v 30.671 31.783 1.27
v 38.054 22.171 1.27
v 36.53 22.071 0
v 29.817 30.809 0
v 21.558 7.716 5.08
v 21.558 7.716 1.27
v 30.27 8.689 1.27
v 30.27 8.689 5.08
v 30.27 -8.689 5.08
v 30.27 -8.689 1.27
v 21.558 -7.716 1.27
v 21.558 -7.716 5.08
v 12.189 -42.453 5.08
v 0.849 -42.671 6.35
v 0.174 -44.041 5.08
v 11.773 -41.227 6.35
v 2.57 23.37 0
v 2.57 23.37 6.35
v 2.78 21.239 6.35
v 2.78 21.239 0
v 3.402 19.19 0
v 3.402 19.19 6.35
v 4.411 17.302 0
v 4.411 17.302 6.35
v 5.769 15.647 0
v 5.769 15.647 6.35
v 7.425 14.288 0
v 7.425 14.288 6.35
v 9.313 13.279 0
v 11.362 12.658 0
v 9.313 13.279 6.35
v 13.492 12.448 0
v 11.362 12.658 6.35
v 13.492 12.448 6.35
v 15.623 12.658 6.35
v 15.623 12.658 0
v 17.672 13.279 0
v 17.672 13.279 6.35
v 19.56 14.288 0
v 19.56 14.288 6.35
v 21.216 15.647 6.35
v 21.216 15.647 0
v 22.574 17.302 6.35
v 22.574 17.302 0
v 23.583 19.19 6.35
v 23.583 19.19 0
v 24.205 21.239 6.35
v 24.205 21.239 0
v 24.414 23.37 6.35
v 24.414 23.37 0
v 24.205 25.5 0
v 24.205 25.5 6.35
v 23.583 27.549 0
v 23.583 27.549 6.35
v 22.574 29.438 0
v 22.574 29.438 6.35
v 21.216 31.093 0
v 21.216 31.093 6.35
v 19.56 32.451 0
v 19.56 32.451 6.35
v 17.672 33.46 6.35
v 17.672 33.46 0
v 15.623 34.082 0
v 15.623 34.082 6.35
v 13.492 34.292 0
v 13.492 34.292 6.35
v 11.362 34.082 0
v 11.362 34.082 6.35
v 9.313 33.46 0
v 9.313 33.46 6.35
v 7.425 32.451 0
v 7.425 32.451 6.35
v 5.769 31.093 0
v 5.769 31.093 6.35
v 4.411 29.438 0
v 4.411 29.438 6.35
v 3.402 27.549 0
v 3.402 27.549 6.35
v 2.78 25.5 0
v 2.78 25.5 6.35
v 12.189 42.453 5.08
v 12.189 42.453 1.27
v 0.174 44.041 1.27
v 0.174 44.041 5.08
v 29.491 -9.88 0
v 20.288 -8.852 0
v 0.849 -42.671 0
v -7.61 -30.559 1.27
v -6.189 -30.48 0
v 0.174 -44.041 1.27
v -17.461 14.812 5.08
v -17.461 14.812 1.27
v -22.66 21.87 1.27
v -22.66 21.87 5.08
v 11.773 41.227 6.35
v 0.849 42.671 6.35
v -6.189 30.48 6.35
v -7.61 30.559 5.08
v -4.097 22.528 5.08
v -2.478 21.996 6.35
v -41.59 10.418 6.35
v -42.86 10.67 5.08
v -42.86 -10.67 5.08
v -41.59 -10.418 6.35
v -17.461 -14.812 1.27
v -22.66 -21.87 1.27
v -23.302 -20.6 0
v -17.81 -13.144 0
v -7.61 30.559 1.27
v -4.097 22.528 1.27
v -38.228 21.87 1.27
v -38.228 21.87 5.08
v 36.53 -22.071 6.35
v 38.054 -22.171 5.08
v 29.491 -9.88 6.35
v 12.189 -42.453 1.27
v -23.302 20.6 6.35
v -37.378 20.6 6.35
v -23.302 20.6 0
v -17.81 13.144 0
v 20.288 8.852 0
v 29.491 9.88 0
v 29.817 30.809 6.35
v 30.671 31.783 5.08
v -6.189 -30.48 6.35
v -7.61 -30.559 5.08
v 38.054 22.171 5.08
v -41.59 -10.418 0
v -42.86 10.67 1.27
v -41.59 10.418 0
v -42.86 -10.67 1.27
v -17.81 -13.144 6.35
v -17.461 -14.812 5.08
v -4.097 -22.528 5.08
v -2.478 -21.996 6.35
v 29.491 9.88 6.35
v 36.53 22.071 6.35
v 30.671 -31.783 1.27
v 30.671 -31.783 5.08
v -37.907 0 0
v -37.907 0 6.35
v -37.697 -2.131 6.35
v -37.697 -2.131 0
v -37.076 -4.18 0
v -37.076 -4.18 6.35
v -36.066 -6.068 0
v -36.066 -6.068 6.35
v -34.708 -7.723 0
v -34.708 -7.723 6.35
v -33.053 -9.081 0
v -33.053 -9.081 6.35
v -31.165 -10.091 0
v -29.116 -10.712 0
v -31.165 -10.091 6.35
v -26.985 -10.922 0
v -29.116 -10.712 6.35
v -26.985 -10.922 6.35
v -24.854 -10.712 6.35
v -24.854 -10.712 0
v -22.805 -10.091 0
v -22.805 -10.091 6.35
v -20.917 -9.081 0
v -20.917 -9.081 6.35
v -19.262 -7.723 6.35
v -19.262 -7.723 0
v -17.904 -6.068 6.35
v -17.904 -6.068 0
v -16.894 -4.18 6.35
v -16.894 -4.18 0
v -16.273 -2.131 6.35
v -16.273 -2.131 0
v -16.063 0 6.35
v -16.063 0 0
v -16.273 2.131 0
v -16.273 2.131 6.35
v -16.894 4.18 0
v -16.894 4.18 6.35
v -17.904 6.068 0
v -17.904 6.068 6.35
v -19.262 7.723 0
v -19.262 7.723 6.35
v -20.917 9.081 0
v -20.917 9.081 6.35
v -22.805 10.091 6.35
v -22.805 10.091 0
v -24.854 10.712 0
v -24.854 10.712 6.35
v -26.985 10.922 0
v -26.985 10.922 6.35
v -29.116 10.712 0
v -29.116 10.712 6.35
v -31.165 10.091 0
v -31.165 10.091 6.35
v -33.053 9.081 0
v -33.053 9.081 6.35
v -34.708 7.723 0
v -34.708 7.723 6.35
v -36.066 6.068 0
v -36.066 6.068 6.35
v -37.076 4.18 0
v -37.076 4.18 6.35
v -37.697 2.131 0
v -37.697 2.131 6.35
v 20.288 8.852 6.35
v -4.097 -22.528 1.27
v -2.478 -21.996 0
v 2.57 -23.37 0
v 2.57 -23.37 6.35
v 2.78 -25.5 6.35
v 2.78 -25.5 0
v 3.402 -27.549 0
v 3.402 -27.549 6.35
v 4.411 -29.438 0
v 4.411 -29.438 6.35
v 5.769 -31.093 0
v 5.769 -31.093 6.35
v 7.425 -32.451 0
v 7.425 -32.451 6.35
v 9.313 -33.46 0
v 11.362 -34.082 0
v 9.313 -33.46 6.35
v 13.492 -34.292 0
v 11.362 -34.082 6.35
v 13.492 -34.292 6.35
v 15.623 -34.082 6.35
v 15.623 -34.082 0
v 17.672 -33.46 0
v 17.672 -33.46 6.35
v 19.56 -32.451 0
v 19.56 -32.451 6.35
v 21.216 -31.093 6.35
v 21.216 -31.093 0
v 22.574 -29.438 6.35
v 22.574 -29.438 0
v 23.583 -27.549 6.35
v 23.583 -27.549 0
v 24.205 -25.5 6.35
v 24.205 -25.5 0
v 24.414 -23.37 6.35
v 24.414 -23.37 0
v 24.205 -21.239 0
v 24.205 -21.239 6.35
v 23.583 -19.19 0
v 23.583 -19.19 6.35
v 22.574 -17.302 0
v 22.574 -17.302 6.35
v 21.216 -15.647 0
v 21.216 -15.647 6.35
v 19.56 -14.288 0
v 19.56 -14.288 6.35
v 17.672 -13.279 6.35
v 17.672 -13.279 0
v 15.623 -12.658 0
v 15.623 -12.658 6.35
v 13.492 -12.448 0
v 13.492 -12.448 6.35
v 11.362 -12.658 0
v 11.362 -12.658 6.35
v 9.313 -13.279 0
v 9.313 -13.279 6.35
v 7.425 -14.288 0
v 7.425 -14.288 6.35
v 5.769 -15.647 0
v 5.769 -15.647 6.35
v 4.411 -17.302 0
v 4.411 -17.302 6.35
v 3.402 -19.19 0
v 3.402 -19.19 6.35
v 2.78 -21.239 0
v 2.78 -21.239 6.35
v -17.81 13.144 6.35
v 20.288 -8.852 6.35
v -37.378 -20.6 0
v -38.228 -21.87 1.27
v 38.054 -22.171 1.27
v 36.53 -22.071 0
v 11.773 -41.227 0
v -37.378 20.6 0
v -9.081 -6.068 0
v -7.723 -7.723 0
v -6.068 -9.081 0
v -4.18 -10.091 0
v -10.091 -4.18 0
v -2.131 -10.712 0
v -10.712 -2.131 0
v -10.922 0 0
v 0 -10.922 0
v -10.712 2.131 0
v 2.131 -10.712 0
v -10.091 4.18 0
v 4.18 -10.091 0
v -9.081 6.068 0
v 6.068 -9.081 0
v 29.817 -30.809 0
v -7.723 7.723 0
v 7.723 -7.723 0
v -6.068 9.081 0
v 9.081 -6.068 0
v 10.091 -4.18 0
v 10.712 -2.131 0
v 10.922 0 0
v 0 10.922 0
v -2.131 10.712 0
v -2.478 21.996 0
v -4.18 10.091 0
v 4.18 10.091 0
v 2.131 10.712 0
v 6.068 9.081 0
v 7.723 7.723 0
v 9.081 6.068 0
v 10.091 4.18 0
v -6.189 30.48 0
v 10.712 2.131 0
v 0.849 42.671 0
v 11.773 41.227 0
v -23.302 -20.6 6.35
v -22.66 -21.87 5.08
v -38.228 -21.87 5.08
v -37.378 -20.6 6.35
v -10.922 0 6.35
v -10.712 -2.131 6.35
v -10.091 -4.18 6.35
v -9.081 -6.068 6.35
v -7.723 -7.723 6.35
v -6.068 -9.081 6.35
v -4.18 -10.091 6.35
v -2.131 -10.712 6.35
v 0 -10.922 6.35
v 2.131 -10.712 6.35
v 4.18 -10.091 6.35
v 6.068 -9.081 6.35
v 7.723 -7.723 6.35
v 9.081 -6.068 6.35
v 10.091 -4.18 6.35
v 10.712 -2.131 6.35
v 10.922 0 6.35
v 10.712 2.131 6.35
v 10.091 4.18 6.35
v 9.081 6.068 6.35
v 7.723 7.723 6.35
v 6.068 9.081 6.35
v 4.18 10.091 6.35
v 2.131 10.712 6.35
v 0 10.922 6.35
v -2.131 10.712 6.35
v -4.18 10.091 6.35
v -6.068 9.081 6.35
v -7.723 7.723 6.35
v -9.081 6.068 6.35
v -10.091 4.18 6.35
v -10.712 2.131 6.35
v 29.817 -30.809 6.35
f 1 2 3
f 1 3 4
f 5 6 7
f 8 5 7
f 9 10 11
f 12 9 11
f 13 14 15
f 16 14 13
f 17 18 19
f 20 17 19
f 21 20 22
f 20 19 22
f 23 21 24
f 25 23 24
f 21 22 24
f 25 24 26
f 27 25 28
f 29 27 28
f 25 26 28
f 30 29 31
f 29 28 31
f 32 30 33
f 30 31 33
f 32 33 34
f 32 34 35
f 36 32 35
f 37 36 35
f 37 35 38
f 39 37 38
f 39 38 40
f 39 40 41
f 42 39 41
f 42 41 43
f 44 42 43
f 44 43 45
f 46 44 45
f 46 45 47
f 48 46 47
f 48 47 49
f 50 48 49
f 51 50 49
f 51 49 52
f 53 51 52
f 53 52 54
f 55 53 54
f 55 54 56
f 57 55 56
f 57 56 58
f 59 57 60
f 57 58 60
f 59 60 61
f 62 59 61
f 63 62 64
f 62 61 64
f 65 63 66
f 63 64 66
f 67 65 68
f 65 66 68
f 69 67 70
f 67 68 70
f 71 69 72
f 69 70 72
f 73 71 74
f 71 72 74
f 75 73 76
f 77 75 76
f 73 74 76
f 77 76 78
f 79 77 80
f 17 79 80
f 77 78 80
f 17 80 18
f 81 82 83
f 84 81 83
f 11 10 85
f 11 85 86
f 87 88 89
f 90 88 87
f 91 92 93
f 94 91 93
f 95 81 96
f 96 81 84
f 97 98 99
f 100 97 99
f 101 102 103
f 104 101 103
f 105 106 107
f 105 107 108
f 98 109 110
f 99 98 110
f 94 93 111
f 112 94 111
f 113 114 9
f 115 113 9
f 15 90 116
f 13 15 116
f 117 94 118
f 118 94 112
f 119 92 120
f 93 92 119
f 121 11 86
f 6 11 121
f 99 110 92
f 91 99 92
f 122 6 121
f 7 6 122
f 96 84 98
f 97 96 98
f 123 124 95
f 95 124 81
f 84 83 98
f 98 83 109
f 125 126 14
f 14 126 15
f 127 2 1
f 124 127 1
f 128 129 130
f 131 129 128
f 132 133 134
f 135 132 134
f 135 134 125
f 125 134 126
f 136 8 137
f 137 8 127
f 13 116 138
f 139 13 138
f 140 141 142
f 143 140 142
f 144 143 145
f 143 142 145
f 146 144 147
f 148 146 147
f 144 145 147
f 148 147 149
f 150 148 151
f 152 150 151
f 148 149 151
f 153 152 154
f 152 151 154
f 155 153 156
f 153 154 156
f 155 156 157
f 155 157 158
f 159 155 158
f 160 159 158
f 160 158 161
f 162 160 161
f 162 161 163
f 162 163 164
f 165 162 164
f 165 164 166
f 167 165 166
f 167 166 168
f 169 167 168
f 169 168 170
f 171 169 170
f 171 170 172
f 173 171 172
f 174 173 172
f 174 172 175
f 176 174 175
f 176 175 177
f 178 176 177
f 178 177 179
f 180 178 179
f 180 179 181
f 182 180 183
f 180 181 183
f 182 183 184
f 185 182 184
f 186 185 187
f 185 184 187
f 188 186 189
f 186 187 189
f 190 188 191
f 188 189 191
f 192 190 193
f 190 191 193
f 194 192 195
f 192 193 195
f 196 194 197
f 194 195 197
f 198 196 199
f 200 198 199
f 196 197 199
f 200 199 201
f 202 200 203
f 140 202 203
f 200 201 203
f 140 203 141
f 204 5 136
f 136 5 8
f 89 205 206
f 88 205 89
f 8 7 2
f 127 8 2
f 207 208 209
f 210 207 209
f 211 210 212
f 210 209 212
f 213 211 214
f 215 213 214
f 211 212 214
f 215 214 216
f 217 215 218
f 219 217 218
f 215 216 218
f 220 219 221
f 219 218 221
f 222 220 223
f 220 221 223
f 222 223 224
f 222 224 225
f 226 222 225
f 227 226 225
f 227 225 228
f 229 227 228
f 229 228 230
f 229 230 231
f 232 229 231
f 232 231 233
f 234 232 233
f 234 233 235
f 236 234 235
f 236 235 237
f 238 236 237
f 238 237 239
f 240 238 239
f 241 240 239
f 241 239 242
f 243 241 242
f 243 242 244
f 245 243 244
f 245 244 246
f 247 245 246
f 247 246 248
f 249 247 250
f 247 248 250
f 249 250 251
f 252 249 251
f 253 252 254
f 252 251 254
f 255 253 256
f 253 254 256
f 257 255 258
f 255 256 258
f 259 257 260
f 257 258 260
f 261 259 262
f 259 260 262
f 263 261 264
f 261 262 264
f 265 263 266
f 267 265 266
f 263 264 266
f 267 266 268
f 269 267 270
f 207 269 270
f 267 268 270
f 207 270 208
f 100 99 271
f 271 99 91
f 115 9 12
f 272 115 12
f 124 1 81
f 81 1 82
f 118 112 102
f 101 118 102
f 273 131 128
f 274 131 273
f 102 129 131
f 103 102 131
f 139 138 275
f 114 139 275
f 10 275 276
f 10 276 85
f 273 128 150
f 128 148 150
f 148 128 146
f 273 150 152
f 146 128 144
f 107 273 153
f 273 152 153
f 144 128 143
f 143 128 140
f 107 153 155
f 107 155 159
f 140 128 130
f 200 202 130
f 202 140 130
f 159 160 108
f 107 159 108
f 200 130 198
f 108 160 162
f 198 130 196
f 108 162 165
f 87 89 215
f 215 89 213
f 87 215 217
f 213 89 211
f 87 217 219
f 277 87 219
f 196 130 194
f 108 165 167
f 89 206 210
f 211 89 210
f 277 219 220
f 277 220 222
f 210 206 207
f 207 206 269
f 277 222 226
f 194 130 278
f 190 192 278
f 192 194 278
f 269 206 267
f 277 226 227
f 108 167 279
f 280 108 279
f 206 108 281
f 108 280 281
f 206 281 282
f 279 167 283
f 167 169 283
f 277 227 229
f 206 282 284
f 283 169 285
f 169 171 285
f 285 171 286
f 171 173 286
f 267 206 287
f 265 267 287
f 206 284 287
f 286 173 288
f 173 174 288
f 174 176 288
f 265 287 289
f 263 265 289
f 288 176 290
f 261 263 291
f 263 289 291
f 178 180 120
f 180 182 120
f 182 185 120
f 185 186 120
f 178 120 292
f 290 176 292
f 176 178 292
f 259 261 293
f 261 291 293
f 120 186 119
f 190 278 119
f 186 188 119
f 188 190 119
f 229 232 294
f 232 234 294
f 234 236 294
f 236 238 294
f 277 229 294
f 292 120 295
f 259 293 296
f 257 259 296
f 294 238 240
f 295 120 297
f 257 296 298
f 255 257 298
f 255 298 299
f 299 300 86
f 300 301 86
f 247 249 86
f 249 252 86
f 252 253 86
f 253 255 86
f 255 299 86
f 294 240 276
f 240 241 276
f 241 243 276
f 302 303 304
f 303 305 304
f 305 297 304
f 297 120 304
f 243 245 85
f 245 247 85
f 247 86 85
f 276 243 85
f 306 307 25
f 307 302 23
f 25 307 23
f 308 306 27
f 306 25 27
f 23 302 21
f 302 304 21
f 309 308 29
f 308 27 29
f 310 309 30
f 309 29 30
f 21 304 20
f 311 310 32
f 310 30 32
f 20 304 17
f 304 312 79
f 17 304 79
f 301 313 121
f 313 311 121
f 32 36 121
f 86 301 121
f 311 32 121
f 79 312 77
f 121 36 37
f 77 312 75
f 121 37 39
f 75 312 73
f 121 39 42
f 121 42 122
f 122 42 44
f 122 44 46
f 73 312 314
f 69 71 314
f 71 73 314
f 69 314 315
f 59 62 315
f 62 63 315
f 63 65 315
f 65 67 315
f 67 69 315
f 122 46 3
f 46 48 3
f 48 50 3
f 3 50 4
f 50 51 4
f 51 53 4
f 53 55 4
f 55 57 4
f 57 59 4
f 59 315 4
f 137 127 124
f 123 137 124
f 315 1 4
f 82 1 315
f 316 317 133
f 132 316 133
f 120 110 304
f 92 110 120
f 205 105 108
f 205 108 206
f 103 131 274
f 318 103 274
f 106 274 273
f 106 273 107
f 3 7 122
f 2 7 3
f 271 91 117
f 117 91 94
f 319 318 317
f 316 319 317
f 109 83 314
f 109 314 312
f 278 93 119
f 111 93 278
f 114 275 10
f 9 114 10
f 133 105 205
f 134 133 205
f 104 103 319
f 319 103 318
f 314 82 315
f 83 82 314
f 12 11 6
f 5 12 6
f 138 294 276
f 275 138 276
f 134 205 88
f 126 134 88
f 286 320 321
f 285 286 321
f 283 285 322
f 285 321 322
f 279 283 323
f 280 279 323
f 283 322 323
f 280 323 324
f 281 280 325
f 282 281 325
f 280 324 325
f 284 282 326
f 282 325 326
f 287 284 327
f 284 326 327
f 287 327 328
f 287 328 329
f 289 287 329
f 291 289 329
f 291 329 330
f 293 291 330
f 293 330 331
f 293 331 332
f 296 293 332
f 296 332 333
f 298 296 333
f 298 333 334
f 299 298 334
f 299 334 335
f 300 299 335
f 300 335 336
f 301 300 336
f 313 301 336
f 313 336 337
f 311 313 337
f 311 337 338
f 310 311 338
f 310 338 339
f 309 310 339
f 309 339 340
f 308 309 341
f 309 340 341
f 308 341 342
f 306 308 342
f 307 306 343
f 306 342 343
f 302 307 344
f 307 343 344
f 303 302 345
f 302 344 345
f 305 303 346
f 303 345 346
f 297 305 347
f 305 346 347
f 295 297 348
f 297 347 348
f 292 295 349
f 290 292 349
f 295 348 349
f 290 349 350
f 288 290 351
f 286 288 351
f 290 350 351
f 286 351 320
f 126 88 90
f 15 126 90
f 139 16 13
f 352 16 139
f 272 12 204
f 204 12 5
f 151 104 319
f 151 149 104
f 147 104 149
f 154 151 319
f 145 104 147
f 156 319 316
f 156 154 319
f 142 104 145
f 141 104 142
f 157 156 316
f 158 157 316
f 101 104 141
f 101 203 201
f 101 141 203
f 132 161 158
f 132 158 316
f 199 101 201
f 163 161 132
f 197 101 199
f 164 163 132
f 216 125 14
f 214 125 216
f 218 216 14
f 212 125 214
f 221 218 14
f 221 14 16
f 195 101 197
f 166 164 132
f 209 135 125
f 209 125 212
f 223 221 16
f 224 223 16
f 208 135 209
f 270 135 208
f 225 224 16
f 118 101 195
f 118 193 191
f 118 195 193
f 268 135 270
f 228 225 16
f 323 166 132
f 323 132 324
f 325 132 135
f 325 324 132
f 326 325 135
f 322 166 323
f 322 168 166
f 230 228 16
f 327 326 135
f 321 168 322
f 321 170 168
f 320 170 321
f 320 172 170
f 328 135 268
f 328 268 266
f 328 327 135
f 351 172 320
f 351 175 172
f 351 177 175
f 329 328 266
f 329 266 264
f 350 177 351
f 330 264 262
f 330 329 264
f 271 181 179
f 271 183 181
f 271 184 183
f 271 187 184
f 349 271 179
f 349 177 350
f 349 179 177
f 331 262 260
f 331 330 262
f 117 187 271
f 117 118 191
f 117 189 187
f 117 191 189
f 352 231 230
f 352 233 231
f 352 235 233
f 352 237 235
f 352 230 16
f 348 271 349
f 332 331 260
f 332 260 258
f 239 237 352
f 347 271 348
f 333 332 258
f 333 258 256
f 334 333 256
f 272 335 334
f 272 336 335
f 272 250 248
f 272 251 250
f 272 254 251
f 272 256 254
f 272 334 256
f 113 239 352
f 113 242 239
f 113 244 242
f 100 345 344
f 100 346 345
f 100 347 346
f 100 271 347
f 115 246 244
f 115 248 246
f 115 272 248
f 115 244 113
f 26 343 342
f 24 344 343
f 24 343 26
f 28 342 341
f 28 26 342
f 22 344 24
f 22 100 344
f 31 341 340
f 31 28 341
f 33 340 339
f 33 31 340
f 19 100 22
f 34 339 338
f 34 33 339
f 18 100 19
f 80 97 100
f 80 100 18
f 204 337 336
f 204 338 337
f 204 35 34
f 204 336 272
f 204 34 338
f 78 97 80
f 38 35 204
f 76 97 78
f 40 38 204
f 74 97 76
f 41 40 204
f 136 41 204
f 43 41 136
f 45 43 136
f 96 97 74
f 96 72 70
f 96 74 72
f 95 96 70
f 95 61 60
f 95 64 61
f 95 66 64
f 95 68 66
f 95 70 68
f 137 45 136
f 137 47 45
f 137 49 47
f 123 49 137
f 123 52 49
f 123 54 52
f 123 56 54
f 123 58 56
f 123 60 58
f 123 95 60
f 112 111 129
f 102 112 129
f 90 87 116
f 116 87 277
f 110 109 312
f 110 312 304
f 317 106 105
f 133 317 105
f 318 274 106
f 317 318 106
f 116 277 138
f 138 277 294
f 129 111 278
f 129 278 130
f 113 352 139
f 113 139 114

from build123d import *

# Parameters (mm, degrees)
F1_DEPTH = 6.35
F2_D     = 21.844
F3_SIZE  = 1.27


with BuildPart() as f1:
    # F0 (on Top) → F1 (new body)
    with BuildSketch(Plane.XY):
        Polygon((12.189453, -42.452835), (21.42998, -37.117814), (30.670507, -31.782793), (38.053966, -22.170926), (30.270115, -8.688899), (21.557817, -7.71608), (21.557817, 7.71608), (30.270115, 8.688899), (38.053966, 22.170926), (30.670507, 31.782793), (21.42998, 37.117814), (12.189453, 42.452835), (0.173602, 44.041164), (-7.61025, 30.559138), (-4.096587, 22.527657), (-17.46123, 14.811577), (-22.659865, 21.870239), (-38.227568, 21.870238), (-42.85996, 10.670042), (-42.85996, 0), (-42.85996, -10.670042), (-38.227568, -21.870238), (-22.659865, -21.870239), (-17.46123, -14.811577), (-4.096587, -22.527657), (-7.61025, -30.559138), (0.173602, -44.041164), align=None)
    extrude(amount=F1_DEPTH)

    # F2 (through all)
    with Locations(Plane(origin=(0, 0, 0), x_dir=(1, 0, 0), z_dir=(0, 0, -1))):
        with Locations((13.49248, 23.369661), (0, 0), (-26.98496, 0), (13.49248, -23.369661)):
            Hole(F2_D / 2)

    # F3
    f3_edges = [f1.edges().sort_by_distance(p)[0] for p in [
        (-3.718324, 37.300151, 0),
        (-3.718324, 37.300151, 6.35),
        (6.181528, 43.247, 6.35),
        (6.181528, 43.247, 0),
        (21.42998, 37.117814, 6.35),
        (21.42998, 37.117814, 0),
        (34.362237, 26.97686, 0),
        (34.362237, 26.97686, 6.35),
        (34.16204, 15.429912, 0),
        (34.16204, 15.429912, 6.35),
        (25.913966, 8.20249, 0),
        (25.913966, 8.20249, 6.35),
        (21.557817, 0, 0),
        (21.557817, 0, 6.35),
        (25.913966, -8.20249, 0),
        (25.913966, -8.20249, 6.35),
        (34.16204, -15.429912, 0),
        (34.16204, -15.429912, 6.35),
        (34.362237, -26.97686, 0),
        (34.362237, -26.97686, 6.35),
        (21.42998, -37.117814, 0),
        (21.42998, -37.117814, 6.35),
        (6.181528, -43.247, 0),
        (6.181528, -43.247, 6.35),
        (-3.718324, -37.300151, 0),
        (-3.718324, -37.300151, 6.35),
        (-5.853418, -26.543398, 0),
        (-5.853418, -26.543398, 6.35),
        (-10.778908, -18.669617, 0),
        (-10.778908, -18.669617, 6.35),
        (-20.060547, -18.340908, 6.35),
        (-20.060547, -18.340908, 0),
        (-30.443716, -21.870239, 6.35),
        (-30.443716, -21.870239, 0),
        (-40.543764, -16.27014, 6.35),
        (-40.543764, -16.27014, 0),
        (-42.85996, 0, 6.35),
        (-42.85996, 0, 0),
        (-40.543764, 16.27014, 6.35),
        (-40.543764, 16.27014, 0),
        (-30.443716, 21.870239, 6.35),
        (-30.443716, 21.870239, 0),
        (-20.060547, 18.340908, 6.35),
        (-20.060547, 18.340908, 0),
        (-10.778908, 18.669617, 6.35),
        (-10.778908, 18.669617, 0),
        (-5.853418, 26.543398, 0),
        (-5.853418, 26.543398, 6.35),
    ]]
    chamfer(f3_edges, length=F3_SIZE)


solid = f1.part
